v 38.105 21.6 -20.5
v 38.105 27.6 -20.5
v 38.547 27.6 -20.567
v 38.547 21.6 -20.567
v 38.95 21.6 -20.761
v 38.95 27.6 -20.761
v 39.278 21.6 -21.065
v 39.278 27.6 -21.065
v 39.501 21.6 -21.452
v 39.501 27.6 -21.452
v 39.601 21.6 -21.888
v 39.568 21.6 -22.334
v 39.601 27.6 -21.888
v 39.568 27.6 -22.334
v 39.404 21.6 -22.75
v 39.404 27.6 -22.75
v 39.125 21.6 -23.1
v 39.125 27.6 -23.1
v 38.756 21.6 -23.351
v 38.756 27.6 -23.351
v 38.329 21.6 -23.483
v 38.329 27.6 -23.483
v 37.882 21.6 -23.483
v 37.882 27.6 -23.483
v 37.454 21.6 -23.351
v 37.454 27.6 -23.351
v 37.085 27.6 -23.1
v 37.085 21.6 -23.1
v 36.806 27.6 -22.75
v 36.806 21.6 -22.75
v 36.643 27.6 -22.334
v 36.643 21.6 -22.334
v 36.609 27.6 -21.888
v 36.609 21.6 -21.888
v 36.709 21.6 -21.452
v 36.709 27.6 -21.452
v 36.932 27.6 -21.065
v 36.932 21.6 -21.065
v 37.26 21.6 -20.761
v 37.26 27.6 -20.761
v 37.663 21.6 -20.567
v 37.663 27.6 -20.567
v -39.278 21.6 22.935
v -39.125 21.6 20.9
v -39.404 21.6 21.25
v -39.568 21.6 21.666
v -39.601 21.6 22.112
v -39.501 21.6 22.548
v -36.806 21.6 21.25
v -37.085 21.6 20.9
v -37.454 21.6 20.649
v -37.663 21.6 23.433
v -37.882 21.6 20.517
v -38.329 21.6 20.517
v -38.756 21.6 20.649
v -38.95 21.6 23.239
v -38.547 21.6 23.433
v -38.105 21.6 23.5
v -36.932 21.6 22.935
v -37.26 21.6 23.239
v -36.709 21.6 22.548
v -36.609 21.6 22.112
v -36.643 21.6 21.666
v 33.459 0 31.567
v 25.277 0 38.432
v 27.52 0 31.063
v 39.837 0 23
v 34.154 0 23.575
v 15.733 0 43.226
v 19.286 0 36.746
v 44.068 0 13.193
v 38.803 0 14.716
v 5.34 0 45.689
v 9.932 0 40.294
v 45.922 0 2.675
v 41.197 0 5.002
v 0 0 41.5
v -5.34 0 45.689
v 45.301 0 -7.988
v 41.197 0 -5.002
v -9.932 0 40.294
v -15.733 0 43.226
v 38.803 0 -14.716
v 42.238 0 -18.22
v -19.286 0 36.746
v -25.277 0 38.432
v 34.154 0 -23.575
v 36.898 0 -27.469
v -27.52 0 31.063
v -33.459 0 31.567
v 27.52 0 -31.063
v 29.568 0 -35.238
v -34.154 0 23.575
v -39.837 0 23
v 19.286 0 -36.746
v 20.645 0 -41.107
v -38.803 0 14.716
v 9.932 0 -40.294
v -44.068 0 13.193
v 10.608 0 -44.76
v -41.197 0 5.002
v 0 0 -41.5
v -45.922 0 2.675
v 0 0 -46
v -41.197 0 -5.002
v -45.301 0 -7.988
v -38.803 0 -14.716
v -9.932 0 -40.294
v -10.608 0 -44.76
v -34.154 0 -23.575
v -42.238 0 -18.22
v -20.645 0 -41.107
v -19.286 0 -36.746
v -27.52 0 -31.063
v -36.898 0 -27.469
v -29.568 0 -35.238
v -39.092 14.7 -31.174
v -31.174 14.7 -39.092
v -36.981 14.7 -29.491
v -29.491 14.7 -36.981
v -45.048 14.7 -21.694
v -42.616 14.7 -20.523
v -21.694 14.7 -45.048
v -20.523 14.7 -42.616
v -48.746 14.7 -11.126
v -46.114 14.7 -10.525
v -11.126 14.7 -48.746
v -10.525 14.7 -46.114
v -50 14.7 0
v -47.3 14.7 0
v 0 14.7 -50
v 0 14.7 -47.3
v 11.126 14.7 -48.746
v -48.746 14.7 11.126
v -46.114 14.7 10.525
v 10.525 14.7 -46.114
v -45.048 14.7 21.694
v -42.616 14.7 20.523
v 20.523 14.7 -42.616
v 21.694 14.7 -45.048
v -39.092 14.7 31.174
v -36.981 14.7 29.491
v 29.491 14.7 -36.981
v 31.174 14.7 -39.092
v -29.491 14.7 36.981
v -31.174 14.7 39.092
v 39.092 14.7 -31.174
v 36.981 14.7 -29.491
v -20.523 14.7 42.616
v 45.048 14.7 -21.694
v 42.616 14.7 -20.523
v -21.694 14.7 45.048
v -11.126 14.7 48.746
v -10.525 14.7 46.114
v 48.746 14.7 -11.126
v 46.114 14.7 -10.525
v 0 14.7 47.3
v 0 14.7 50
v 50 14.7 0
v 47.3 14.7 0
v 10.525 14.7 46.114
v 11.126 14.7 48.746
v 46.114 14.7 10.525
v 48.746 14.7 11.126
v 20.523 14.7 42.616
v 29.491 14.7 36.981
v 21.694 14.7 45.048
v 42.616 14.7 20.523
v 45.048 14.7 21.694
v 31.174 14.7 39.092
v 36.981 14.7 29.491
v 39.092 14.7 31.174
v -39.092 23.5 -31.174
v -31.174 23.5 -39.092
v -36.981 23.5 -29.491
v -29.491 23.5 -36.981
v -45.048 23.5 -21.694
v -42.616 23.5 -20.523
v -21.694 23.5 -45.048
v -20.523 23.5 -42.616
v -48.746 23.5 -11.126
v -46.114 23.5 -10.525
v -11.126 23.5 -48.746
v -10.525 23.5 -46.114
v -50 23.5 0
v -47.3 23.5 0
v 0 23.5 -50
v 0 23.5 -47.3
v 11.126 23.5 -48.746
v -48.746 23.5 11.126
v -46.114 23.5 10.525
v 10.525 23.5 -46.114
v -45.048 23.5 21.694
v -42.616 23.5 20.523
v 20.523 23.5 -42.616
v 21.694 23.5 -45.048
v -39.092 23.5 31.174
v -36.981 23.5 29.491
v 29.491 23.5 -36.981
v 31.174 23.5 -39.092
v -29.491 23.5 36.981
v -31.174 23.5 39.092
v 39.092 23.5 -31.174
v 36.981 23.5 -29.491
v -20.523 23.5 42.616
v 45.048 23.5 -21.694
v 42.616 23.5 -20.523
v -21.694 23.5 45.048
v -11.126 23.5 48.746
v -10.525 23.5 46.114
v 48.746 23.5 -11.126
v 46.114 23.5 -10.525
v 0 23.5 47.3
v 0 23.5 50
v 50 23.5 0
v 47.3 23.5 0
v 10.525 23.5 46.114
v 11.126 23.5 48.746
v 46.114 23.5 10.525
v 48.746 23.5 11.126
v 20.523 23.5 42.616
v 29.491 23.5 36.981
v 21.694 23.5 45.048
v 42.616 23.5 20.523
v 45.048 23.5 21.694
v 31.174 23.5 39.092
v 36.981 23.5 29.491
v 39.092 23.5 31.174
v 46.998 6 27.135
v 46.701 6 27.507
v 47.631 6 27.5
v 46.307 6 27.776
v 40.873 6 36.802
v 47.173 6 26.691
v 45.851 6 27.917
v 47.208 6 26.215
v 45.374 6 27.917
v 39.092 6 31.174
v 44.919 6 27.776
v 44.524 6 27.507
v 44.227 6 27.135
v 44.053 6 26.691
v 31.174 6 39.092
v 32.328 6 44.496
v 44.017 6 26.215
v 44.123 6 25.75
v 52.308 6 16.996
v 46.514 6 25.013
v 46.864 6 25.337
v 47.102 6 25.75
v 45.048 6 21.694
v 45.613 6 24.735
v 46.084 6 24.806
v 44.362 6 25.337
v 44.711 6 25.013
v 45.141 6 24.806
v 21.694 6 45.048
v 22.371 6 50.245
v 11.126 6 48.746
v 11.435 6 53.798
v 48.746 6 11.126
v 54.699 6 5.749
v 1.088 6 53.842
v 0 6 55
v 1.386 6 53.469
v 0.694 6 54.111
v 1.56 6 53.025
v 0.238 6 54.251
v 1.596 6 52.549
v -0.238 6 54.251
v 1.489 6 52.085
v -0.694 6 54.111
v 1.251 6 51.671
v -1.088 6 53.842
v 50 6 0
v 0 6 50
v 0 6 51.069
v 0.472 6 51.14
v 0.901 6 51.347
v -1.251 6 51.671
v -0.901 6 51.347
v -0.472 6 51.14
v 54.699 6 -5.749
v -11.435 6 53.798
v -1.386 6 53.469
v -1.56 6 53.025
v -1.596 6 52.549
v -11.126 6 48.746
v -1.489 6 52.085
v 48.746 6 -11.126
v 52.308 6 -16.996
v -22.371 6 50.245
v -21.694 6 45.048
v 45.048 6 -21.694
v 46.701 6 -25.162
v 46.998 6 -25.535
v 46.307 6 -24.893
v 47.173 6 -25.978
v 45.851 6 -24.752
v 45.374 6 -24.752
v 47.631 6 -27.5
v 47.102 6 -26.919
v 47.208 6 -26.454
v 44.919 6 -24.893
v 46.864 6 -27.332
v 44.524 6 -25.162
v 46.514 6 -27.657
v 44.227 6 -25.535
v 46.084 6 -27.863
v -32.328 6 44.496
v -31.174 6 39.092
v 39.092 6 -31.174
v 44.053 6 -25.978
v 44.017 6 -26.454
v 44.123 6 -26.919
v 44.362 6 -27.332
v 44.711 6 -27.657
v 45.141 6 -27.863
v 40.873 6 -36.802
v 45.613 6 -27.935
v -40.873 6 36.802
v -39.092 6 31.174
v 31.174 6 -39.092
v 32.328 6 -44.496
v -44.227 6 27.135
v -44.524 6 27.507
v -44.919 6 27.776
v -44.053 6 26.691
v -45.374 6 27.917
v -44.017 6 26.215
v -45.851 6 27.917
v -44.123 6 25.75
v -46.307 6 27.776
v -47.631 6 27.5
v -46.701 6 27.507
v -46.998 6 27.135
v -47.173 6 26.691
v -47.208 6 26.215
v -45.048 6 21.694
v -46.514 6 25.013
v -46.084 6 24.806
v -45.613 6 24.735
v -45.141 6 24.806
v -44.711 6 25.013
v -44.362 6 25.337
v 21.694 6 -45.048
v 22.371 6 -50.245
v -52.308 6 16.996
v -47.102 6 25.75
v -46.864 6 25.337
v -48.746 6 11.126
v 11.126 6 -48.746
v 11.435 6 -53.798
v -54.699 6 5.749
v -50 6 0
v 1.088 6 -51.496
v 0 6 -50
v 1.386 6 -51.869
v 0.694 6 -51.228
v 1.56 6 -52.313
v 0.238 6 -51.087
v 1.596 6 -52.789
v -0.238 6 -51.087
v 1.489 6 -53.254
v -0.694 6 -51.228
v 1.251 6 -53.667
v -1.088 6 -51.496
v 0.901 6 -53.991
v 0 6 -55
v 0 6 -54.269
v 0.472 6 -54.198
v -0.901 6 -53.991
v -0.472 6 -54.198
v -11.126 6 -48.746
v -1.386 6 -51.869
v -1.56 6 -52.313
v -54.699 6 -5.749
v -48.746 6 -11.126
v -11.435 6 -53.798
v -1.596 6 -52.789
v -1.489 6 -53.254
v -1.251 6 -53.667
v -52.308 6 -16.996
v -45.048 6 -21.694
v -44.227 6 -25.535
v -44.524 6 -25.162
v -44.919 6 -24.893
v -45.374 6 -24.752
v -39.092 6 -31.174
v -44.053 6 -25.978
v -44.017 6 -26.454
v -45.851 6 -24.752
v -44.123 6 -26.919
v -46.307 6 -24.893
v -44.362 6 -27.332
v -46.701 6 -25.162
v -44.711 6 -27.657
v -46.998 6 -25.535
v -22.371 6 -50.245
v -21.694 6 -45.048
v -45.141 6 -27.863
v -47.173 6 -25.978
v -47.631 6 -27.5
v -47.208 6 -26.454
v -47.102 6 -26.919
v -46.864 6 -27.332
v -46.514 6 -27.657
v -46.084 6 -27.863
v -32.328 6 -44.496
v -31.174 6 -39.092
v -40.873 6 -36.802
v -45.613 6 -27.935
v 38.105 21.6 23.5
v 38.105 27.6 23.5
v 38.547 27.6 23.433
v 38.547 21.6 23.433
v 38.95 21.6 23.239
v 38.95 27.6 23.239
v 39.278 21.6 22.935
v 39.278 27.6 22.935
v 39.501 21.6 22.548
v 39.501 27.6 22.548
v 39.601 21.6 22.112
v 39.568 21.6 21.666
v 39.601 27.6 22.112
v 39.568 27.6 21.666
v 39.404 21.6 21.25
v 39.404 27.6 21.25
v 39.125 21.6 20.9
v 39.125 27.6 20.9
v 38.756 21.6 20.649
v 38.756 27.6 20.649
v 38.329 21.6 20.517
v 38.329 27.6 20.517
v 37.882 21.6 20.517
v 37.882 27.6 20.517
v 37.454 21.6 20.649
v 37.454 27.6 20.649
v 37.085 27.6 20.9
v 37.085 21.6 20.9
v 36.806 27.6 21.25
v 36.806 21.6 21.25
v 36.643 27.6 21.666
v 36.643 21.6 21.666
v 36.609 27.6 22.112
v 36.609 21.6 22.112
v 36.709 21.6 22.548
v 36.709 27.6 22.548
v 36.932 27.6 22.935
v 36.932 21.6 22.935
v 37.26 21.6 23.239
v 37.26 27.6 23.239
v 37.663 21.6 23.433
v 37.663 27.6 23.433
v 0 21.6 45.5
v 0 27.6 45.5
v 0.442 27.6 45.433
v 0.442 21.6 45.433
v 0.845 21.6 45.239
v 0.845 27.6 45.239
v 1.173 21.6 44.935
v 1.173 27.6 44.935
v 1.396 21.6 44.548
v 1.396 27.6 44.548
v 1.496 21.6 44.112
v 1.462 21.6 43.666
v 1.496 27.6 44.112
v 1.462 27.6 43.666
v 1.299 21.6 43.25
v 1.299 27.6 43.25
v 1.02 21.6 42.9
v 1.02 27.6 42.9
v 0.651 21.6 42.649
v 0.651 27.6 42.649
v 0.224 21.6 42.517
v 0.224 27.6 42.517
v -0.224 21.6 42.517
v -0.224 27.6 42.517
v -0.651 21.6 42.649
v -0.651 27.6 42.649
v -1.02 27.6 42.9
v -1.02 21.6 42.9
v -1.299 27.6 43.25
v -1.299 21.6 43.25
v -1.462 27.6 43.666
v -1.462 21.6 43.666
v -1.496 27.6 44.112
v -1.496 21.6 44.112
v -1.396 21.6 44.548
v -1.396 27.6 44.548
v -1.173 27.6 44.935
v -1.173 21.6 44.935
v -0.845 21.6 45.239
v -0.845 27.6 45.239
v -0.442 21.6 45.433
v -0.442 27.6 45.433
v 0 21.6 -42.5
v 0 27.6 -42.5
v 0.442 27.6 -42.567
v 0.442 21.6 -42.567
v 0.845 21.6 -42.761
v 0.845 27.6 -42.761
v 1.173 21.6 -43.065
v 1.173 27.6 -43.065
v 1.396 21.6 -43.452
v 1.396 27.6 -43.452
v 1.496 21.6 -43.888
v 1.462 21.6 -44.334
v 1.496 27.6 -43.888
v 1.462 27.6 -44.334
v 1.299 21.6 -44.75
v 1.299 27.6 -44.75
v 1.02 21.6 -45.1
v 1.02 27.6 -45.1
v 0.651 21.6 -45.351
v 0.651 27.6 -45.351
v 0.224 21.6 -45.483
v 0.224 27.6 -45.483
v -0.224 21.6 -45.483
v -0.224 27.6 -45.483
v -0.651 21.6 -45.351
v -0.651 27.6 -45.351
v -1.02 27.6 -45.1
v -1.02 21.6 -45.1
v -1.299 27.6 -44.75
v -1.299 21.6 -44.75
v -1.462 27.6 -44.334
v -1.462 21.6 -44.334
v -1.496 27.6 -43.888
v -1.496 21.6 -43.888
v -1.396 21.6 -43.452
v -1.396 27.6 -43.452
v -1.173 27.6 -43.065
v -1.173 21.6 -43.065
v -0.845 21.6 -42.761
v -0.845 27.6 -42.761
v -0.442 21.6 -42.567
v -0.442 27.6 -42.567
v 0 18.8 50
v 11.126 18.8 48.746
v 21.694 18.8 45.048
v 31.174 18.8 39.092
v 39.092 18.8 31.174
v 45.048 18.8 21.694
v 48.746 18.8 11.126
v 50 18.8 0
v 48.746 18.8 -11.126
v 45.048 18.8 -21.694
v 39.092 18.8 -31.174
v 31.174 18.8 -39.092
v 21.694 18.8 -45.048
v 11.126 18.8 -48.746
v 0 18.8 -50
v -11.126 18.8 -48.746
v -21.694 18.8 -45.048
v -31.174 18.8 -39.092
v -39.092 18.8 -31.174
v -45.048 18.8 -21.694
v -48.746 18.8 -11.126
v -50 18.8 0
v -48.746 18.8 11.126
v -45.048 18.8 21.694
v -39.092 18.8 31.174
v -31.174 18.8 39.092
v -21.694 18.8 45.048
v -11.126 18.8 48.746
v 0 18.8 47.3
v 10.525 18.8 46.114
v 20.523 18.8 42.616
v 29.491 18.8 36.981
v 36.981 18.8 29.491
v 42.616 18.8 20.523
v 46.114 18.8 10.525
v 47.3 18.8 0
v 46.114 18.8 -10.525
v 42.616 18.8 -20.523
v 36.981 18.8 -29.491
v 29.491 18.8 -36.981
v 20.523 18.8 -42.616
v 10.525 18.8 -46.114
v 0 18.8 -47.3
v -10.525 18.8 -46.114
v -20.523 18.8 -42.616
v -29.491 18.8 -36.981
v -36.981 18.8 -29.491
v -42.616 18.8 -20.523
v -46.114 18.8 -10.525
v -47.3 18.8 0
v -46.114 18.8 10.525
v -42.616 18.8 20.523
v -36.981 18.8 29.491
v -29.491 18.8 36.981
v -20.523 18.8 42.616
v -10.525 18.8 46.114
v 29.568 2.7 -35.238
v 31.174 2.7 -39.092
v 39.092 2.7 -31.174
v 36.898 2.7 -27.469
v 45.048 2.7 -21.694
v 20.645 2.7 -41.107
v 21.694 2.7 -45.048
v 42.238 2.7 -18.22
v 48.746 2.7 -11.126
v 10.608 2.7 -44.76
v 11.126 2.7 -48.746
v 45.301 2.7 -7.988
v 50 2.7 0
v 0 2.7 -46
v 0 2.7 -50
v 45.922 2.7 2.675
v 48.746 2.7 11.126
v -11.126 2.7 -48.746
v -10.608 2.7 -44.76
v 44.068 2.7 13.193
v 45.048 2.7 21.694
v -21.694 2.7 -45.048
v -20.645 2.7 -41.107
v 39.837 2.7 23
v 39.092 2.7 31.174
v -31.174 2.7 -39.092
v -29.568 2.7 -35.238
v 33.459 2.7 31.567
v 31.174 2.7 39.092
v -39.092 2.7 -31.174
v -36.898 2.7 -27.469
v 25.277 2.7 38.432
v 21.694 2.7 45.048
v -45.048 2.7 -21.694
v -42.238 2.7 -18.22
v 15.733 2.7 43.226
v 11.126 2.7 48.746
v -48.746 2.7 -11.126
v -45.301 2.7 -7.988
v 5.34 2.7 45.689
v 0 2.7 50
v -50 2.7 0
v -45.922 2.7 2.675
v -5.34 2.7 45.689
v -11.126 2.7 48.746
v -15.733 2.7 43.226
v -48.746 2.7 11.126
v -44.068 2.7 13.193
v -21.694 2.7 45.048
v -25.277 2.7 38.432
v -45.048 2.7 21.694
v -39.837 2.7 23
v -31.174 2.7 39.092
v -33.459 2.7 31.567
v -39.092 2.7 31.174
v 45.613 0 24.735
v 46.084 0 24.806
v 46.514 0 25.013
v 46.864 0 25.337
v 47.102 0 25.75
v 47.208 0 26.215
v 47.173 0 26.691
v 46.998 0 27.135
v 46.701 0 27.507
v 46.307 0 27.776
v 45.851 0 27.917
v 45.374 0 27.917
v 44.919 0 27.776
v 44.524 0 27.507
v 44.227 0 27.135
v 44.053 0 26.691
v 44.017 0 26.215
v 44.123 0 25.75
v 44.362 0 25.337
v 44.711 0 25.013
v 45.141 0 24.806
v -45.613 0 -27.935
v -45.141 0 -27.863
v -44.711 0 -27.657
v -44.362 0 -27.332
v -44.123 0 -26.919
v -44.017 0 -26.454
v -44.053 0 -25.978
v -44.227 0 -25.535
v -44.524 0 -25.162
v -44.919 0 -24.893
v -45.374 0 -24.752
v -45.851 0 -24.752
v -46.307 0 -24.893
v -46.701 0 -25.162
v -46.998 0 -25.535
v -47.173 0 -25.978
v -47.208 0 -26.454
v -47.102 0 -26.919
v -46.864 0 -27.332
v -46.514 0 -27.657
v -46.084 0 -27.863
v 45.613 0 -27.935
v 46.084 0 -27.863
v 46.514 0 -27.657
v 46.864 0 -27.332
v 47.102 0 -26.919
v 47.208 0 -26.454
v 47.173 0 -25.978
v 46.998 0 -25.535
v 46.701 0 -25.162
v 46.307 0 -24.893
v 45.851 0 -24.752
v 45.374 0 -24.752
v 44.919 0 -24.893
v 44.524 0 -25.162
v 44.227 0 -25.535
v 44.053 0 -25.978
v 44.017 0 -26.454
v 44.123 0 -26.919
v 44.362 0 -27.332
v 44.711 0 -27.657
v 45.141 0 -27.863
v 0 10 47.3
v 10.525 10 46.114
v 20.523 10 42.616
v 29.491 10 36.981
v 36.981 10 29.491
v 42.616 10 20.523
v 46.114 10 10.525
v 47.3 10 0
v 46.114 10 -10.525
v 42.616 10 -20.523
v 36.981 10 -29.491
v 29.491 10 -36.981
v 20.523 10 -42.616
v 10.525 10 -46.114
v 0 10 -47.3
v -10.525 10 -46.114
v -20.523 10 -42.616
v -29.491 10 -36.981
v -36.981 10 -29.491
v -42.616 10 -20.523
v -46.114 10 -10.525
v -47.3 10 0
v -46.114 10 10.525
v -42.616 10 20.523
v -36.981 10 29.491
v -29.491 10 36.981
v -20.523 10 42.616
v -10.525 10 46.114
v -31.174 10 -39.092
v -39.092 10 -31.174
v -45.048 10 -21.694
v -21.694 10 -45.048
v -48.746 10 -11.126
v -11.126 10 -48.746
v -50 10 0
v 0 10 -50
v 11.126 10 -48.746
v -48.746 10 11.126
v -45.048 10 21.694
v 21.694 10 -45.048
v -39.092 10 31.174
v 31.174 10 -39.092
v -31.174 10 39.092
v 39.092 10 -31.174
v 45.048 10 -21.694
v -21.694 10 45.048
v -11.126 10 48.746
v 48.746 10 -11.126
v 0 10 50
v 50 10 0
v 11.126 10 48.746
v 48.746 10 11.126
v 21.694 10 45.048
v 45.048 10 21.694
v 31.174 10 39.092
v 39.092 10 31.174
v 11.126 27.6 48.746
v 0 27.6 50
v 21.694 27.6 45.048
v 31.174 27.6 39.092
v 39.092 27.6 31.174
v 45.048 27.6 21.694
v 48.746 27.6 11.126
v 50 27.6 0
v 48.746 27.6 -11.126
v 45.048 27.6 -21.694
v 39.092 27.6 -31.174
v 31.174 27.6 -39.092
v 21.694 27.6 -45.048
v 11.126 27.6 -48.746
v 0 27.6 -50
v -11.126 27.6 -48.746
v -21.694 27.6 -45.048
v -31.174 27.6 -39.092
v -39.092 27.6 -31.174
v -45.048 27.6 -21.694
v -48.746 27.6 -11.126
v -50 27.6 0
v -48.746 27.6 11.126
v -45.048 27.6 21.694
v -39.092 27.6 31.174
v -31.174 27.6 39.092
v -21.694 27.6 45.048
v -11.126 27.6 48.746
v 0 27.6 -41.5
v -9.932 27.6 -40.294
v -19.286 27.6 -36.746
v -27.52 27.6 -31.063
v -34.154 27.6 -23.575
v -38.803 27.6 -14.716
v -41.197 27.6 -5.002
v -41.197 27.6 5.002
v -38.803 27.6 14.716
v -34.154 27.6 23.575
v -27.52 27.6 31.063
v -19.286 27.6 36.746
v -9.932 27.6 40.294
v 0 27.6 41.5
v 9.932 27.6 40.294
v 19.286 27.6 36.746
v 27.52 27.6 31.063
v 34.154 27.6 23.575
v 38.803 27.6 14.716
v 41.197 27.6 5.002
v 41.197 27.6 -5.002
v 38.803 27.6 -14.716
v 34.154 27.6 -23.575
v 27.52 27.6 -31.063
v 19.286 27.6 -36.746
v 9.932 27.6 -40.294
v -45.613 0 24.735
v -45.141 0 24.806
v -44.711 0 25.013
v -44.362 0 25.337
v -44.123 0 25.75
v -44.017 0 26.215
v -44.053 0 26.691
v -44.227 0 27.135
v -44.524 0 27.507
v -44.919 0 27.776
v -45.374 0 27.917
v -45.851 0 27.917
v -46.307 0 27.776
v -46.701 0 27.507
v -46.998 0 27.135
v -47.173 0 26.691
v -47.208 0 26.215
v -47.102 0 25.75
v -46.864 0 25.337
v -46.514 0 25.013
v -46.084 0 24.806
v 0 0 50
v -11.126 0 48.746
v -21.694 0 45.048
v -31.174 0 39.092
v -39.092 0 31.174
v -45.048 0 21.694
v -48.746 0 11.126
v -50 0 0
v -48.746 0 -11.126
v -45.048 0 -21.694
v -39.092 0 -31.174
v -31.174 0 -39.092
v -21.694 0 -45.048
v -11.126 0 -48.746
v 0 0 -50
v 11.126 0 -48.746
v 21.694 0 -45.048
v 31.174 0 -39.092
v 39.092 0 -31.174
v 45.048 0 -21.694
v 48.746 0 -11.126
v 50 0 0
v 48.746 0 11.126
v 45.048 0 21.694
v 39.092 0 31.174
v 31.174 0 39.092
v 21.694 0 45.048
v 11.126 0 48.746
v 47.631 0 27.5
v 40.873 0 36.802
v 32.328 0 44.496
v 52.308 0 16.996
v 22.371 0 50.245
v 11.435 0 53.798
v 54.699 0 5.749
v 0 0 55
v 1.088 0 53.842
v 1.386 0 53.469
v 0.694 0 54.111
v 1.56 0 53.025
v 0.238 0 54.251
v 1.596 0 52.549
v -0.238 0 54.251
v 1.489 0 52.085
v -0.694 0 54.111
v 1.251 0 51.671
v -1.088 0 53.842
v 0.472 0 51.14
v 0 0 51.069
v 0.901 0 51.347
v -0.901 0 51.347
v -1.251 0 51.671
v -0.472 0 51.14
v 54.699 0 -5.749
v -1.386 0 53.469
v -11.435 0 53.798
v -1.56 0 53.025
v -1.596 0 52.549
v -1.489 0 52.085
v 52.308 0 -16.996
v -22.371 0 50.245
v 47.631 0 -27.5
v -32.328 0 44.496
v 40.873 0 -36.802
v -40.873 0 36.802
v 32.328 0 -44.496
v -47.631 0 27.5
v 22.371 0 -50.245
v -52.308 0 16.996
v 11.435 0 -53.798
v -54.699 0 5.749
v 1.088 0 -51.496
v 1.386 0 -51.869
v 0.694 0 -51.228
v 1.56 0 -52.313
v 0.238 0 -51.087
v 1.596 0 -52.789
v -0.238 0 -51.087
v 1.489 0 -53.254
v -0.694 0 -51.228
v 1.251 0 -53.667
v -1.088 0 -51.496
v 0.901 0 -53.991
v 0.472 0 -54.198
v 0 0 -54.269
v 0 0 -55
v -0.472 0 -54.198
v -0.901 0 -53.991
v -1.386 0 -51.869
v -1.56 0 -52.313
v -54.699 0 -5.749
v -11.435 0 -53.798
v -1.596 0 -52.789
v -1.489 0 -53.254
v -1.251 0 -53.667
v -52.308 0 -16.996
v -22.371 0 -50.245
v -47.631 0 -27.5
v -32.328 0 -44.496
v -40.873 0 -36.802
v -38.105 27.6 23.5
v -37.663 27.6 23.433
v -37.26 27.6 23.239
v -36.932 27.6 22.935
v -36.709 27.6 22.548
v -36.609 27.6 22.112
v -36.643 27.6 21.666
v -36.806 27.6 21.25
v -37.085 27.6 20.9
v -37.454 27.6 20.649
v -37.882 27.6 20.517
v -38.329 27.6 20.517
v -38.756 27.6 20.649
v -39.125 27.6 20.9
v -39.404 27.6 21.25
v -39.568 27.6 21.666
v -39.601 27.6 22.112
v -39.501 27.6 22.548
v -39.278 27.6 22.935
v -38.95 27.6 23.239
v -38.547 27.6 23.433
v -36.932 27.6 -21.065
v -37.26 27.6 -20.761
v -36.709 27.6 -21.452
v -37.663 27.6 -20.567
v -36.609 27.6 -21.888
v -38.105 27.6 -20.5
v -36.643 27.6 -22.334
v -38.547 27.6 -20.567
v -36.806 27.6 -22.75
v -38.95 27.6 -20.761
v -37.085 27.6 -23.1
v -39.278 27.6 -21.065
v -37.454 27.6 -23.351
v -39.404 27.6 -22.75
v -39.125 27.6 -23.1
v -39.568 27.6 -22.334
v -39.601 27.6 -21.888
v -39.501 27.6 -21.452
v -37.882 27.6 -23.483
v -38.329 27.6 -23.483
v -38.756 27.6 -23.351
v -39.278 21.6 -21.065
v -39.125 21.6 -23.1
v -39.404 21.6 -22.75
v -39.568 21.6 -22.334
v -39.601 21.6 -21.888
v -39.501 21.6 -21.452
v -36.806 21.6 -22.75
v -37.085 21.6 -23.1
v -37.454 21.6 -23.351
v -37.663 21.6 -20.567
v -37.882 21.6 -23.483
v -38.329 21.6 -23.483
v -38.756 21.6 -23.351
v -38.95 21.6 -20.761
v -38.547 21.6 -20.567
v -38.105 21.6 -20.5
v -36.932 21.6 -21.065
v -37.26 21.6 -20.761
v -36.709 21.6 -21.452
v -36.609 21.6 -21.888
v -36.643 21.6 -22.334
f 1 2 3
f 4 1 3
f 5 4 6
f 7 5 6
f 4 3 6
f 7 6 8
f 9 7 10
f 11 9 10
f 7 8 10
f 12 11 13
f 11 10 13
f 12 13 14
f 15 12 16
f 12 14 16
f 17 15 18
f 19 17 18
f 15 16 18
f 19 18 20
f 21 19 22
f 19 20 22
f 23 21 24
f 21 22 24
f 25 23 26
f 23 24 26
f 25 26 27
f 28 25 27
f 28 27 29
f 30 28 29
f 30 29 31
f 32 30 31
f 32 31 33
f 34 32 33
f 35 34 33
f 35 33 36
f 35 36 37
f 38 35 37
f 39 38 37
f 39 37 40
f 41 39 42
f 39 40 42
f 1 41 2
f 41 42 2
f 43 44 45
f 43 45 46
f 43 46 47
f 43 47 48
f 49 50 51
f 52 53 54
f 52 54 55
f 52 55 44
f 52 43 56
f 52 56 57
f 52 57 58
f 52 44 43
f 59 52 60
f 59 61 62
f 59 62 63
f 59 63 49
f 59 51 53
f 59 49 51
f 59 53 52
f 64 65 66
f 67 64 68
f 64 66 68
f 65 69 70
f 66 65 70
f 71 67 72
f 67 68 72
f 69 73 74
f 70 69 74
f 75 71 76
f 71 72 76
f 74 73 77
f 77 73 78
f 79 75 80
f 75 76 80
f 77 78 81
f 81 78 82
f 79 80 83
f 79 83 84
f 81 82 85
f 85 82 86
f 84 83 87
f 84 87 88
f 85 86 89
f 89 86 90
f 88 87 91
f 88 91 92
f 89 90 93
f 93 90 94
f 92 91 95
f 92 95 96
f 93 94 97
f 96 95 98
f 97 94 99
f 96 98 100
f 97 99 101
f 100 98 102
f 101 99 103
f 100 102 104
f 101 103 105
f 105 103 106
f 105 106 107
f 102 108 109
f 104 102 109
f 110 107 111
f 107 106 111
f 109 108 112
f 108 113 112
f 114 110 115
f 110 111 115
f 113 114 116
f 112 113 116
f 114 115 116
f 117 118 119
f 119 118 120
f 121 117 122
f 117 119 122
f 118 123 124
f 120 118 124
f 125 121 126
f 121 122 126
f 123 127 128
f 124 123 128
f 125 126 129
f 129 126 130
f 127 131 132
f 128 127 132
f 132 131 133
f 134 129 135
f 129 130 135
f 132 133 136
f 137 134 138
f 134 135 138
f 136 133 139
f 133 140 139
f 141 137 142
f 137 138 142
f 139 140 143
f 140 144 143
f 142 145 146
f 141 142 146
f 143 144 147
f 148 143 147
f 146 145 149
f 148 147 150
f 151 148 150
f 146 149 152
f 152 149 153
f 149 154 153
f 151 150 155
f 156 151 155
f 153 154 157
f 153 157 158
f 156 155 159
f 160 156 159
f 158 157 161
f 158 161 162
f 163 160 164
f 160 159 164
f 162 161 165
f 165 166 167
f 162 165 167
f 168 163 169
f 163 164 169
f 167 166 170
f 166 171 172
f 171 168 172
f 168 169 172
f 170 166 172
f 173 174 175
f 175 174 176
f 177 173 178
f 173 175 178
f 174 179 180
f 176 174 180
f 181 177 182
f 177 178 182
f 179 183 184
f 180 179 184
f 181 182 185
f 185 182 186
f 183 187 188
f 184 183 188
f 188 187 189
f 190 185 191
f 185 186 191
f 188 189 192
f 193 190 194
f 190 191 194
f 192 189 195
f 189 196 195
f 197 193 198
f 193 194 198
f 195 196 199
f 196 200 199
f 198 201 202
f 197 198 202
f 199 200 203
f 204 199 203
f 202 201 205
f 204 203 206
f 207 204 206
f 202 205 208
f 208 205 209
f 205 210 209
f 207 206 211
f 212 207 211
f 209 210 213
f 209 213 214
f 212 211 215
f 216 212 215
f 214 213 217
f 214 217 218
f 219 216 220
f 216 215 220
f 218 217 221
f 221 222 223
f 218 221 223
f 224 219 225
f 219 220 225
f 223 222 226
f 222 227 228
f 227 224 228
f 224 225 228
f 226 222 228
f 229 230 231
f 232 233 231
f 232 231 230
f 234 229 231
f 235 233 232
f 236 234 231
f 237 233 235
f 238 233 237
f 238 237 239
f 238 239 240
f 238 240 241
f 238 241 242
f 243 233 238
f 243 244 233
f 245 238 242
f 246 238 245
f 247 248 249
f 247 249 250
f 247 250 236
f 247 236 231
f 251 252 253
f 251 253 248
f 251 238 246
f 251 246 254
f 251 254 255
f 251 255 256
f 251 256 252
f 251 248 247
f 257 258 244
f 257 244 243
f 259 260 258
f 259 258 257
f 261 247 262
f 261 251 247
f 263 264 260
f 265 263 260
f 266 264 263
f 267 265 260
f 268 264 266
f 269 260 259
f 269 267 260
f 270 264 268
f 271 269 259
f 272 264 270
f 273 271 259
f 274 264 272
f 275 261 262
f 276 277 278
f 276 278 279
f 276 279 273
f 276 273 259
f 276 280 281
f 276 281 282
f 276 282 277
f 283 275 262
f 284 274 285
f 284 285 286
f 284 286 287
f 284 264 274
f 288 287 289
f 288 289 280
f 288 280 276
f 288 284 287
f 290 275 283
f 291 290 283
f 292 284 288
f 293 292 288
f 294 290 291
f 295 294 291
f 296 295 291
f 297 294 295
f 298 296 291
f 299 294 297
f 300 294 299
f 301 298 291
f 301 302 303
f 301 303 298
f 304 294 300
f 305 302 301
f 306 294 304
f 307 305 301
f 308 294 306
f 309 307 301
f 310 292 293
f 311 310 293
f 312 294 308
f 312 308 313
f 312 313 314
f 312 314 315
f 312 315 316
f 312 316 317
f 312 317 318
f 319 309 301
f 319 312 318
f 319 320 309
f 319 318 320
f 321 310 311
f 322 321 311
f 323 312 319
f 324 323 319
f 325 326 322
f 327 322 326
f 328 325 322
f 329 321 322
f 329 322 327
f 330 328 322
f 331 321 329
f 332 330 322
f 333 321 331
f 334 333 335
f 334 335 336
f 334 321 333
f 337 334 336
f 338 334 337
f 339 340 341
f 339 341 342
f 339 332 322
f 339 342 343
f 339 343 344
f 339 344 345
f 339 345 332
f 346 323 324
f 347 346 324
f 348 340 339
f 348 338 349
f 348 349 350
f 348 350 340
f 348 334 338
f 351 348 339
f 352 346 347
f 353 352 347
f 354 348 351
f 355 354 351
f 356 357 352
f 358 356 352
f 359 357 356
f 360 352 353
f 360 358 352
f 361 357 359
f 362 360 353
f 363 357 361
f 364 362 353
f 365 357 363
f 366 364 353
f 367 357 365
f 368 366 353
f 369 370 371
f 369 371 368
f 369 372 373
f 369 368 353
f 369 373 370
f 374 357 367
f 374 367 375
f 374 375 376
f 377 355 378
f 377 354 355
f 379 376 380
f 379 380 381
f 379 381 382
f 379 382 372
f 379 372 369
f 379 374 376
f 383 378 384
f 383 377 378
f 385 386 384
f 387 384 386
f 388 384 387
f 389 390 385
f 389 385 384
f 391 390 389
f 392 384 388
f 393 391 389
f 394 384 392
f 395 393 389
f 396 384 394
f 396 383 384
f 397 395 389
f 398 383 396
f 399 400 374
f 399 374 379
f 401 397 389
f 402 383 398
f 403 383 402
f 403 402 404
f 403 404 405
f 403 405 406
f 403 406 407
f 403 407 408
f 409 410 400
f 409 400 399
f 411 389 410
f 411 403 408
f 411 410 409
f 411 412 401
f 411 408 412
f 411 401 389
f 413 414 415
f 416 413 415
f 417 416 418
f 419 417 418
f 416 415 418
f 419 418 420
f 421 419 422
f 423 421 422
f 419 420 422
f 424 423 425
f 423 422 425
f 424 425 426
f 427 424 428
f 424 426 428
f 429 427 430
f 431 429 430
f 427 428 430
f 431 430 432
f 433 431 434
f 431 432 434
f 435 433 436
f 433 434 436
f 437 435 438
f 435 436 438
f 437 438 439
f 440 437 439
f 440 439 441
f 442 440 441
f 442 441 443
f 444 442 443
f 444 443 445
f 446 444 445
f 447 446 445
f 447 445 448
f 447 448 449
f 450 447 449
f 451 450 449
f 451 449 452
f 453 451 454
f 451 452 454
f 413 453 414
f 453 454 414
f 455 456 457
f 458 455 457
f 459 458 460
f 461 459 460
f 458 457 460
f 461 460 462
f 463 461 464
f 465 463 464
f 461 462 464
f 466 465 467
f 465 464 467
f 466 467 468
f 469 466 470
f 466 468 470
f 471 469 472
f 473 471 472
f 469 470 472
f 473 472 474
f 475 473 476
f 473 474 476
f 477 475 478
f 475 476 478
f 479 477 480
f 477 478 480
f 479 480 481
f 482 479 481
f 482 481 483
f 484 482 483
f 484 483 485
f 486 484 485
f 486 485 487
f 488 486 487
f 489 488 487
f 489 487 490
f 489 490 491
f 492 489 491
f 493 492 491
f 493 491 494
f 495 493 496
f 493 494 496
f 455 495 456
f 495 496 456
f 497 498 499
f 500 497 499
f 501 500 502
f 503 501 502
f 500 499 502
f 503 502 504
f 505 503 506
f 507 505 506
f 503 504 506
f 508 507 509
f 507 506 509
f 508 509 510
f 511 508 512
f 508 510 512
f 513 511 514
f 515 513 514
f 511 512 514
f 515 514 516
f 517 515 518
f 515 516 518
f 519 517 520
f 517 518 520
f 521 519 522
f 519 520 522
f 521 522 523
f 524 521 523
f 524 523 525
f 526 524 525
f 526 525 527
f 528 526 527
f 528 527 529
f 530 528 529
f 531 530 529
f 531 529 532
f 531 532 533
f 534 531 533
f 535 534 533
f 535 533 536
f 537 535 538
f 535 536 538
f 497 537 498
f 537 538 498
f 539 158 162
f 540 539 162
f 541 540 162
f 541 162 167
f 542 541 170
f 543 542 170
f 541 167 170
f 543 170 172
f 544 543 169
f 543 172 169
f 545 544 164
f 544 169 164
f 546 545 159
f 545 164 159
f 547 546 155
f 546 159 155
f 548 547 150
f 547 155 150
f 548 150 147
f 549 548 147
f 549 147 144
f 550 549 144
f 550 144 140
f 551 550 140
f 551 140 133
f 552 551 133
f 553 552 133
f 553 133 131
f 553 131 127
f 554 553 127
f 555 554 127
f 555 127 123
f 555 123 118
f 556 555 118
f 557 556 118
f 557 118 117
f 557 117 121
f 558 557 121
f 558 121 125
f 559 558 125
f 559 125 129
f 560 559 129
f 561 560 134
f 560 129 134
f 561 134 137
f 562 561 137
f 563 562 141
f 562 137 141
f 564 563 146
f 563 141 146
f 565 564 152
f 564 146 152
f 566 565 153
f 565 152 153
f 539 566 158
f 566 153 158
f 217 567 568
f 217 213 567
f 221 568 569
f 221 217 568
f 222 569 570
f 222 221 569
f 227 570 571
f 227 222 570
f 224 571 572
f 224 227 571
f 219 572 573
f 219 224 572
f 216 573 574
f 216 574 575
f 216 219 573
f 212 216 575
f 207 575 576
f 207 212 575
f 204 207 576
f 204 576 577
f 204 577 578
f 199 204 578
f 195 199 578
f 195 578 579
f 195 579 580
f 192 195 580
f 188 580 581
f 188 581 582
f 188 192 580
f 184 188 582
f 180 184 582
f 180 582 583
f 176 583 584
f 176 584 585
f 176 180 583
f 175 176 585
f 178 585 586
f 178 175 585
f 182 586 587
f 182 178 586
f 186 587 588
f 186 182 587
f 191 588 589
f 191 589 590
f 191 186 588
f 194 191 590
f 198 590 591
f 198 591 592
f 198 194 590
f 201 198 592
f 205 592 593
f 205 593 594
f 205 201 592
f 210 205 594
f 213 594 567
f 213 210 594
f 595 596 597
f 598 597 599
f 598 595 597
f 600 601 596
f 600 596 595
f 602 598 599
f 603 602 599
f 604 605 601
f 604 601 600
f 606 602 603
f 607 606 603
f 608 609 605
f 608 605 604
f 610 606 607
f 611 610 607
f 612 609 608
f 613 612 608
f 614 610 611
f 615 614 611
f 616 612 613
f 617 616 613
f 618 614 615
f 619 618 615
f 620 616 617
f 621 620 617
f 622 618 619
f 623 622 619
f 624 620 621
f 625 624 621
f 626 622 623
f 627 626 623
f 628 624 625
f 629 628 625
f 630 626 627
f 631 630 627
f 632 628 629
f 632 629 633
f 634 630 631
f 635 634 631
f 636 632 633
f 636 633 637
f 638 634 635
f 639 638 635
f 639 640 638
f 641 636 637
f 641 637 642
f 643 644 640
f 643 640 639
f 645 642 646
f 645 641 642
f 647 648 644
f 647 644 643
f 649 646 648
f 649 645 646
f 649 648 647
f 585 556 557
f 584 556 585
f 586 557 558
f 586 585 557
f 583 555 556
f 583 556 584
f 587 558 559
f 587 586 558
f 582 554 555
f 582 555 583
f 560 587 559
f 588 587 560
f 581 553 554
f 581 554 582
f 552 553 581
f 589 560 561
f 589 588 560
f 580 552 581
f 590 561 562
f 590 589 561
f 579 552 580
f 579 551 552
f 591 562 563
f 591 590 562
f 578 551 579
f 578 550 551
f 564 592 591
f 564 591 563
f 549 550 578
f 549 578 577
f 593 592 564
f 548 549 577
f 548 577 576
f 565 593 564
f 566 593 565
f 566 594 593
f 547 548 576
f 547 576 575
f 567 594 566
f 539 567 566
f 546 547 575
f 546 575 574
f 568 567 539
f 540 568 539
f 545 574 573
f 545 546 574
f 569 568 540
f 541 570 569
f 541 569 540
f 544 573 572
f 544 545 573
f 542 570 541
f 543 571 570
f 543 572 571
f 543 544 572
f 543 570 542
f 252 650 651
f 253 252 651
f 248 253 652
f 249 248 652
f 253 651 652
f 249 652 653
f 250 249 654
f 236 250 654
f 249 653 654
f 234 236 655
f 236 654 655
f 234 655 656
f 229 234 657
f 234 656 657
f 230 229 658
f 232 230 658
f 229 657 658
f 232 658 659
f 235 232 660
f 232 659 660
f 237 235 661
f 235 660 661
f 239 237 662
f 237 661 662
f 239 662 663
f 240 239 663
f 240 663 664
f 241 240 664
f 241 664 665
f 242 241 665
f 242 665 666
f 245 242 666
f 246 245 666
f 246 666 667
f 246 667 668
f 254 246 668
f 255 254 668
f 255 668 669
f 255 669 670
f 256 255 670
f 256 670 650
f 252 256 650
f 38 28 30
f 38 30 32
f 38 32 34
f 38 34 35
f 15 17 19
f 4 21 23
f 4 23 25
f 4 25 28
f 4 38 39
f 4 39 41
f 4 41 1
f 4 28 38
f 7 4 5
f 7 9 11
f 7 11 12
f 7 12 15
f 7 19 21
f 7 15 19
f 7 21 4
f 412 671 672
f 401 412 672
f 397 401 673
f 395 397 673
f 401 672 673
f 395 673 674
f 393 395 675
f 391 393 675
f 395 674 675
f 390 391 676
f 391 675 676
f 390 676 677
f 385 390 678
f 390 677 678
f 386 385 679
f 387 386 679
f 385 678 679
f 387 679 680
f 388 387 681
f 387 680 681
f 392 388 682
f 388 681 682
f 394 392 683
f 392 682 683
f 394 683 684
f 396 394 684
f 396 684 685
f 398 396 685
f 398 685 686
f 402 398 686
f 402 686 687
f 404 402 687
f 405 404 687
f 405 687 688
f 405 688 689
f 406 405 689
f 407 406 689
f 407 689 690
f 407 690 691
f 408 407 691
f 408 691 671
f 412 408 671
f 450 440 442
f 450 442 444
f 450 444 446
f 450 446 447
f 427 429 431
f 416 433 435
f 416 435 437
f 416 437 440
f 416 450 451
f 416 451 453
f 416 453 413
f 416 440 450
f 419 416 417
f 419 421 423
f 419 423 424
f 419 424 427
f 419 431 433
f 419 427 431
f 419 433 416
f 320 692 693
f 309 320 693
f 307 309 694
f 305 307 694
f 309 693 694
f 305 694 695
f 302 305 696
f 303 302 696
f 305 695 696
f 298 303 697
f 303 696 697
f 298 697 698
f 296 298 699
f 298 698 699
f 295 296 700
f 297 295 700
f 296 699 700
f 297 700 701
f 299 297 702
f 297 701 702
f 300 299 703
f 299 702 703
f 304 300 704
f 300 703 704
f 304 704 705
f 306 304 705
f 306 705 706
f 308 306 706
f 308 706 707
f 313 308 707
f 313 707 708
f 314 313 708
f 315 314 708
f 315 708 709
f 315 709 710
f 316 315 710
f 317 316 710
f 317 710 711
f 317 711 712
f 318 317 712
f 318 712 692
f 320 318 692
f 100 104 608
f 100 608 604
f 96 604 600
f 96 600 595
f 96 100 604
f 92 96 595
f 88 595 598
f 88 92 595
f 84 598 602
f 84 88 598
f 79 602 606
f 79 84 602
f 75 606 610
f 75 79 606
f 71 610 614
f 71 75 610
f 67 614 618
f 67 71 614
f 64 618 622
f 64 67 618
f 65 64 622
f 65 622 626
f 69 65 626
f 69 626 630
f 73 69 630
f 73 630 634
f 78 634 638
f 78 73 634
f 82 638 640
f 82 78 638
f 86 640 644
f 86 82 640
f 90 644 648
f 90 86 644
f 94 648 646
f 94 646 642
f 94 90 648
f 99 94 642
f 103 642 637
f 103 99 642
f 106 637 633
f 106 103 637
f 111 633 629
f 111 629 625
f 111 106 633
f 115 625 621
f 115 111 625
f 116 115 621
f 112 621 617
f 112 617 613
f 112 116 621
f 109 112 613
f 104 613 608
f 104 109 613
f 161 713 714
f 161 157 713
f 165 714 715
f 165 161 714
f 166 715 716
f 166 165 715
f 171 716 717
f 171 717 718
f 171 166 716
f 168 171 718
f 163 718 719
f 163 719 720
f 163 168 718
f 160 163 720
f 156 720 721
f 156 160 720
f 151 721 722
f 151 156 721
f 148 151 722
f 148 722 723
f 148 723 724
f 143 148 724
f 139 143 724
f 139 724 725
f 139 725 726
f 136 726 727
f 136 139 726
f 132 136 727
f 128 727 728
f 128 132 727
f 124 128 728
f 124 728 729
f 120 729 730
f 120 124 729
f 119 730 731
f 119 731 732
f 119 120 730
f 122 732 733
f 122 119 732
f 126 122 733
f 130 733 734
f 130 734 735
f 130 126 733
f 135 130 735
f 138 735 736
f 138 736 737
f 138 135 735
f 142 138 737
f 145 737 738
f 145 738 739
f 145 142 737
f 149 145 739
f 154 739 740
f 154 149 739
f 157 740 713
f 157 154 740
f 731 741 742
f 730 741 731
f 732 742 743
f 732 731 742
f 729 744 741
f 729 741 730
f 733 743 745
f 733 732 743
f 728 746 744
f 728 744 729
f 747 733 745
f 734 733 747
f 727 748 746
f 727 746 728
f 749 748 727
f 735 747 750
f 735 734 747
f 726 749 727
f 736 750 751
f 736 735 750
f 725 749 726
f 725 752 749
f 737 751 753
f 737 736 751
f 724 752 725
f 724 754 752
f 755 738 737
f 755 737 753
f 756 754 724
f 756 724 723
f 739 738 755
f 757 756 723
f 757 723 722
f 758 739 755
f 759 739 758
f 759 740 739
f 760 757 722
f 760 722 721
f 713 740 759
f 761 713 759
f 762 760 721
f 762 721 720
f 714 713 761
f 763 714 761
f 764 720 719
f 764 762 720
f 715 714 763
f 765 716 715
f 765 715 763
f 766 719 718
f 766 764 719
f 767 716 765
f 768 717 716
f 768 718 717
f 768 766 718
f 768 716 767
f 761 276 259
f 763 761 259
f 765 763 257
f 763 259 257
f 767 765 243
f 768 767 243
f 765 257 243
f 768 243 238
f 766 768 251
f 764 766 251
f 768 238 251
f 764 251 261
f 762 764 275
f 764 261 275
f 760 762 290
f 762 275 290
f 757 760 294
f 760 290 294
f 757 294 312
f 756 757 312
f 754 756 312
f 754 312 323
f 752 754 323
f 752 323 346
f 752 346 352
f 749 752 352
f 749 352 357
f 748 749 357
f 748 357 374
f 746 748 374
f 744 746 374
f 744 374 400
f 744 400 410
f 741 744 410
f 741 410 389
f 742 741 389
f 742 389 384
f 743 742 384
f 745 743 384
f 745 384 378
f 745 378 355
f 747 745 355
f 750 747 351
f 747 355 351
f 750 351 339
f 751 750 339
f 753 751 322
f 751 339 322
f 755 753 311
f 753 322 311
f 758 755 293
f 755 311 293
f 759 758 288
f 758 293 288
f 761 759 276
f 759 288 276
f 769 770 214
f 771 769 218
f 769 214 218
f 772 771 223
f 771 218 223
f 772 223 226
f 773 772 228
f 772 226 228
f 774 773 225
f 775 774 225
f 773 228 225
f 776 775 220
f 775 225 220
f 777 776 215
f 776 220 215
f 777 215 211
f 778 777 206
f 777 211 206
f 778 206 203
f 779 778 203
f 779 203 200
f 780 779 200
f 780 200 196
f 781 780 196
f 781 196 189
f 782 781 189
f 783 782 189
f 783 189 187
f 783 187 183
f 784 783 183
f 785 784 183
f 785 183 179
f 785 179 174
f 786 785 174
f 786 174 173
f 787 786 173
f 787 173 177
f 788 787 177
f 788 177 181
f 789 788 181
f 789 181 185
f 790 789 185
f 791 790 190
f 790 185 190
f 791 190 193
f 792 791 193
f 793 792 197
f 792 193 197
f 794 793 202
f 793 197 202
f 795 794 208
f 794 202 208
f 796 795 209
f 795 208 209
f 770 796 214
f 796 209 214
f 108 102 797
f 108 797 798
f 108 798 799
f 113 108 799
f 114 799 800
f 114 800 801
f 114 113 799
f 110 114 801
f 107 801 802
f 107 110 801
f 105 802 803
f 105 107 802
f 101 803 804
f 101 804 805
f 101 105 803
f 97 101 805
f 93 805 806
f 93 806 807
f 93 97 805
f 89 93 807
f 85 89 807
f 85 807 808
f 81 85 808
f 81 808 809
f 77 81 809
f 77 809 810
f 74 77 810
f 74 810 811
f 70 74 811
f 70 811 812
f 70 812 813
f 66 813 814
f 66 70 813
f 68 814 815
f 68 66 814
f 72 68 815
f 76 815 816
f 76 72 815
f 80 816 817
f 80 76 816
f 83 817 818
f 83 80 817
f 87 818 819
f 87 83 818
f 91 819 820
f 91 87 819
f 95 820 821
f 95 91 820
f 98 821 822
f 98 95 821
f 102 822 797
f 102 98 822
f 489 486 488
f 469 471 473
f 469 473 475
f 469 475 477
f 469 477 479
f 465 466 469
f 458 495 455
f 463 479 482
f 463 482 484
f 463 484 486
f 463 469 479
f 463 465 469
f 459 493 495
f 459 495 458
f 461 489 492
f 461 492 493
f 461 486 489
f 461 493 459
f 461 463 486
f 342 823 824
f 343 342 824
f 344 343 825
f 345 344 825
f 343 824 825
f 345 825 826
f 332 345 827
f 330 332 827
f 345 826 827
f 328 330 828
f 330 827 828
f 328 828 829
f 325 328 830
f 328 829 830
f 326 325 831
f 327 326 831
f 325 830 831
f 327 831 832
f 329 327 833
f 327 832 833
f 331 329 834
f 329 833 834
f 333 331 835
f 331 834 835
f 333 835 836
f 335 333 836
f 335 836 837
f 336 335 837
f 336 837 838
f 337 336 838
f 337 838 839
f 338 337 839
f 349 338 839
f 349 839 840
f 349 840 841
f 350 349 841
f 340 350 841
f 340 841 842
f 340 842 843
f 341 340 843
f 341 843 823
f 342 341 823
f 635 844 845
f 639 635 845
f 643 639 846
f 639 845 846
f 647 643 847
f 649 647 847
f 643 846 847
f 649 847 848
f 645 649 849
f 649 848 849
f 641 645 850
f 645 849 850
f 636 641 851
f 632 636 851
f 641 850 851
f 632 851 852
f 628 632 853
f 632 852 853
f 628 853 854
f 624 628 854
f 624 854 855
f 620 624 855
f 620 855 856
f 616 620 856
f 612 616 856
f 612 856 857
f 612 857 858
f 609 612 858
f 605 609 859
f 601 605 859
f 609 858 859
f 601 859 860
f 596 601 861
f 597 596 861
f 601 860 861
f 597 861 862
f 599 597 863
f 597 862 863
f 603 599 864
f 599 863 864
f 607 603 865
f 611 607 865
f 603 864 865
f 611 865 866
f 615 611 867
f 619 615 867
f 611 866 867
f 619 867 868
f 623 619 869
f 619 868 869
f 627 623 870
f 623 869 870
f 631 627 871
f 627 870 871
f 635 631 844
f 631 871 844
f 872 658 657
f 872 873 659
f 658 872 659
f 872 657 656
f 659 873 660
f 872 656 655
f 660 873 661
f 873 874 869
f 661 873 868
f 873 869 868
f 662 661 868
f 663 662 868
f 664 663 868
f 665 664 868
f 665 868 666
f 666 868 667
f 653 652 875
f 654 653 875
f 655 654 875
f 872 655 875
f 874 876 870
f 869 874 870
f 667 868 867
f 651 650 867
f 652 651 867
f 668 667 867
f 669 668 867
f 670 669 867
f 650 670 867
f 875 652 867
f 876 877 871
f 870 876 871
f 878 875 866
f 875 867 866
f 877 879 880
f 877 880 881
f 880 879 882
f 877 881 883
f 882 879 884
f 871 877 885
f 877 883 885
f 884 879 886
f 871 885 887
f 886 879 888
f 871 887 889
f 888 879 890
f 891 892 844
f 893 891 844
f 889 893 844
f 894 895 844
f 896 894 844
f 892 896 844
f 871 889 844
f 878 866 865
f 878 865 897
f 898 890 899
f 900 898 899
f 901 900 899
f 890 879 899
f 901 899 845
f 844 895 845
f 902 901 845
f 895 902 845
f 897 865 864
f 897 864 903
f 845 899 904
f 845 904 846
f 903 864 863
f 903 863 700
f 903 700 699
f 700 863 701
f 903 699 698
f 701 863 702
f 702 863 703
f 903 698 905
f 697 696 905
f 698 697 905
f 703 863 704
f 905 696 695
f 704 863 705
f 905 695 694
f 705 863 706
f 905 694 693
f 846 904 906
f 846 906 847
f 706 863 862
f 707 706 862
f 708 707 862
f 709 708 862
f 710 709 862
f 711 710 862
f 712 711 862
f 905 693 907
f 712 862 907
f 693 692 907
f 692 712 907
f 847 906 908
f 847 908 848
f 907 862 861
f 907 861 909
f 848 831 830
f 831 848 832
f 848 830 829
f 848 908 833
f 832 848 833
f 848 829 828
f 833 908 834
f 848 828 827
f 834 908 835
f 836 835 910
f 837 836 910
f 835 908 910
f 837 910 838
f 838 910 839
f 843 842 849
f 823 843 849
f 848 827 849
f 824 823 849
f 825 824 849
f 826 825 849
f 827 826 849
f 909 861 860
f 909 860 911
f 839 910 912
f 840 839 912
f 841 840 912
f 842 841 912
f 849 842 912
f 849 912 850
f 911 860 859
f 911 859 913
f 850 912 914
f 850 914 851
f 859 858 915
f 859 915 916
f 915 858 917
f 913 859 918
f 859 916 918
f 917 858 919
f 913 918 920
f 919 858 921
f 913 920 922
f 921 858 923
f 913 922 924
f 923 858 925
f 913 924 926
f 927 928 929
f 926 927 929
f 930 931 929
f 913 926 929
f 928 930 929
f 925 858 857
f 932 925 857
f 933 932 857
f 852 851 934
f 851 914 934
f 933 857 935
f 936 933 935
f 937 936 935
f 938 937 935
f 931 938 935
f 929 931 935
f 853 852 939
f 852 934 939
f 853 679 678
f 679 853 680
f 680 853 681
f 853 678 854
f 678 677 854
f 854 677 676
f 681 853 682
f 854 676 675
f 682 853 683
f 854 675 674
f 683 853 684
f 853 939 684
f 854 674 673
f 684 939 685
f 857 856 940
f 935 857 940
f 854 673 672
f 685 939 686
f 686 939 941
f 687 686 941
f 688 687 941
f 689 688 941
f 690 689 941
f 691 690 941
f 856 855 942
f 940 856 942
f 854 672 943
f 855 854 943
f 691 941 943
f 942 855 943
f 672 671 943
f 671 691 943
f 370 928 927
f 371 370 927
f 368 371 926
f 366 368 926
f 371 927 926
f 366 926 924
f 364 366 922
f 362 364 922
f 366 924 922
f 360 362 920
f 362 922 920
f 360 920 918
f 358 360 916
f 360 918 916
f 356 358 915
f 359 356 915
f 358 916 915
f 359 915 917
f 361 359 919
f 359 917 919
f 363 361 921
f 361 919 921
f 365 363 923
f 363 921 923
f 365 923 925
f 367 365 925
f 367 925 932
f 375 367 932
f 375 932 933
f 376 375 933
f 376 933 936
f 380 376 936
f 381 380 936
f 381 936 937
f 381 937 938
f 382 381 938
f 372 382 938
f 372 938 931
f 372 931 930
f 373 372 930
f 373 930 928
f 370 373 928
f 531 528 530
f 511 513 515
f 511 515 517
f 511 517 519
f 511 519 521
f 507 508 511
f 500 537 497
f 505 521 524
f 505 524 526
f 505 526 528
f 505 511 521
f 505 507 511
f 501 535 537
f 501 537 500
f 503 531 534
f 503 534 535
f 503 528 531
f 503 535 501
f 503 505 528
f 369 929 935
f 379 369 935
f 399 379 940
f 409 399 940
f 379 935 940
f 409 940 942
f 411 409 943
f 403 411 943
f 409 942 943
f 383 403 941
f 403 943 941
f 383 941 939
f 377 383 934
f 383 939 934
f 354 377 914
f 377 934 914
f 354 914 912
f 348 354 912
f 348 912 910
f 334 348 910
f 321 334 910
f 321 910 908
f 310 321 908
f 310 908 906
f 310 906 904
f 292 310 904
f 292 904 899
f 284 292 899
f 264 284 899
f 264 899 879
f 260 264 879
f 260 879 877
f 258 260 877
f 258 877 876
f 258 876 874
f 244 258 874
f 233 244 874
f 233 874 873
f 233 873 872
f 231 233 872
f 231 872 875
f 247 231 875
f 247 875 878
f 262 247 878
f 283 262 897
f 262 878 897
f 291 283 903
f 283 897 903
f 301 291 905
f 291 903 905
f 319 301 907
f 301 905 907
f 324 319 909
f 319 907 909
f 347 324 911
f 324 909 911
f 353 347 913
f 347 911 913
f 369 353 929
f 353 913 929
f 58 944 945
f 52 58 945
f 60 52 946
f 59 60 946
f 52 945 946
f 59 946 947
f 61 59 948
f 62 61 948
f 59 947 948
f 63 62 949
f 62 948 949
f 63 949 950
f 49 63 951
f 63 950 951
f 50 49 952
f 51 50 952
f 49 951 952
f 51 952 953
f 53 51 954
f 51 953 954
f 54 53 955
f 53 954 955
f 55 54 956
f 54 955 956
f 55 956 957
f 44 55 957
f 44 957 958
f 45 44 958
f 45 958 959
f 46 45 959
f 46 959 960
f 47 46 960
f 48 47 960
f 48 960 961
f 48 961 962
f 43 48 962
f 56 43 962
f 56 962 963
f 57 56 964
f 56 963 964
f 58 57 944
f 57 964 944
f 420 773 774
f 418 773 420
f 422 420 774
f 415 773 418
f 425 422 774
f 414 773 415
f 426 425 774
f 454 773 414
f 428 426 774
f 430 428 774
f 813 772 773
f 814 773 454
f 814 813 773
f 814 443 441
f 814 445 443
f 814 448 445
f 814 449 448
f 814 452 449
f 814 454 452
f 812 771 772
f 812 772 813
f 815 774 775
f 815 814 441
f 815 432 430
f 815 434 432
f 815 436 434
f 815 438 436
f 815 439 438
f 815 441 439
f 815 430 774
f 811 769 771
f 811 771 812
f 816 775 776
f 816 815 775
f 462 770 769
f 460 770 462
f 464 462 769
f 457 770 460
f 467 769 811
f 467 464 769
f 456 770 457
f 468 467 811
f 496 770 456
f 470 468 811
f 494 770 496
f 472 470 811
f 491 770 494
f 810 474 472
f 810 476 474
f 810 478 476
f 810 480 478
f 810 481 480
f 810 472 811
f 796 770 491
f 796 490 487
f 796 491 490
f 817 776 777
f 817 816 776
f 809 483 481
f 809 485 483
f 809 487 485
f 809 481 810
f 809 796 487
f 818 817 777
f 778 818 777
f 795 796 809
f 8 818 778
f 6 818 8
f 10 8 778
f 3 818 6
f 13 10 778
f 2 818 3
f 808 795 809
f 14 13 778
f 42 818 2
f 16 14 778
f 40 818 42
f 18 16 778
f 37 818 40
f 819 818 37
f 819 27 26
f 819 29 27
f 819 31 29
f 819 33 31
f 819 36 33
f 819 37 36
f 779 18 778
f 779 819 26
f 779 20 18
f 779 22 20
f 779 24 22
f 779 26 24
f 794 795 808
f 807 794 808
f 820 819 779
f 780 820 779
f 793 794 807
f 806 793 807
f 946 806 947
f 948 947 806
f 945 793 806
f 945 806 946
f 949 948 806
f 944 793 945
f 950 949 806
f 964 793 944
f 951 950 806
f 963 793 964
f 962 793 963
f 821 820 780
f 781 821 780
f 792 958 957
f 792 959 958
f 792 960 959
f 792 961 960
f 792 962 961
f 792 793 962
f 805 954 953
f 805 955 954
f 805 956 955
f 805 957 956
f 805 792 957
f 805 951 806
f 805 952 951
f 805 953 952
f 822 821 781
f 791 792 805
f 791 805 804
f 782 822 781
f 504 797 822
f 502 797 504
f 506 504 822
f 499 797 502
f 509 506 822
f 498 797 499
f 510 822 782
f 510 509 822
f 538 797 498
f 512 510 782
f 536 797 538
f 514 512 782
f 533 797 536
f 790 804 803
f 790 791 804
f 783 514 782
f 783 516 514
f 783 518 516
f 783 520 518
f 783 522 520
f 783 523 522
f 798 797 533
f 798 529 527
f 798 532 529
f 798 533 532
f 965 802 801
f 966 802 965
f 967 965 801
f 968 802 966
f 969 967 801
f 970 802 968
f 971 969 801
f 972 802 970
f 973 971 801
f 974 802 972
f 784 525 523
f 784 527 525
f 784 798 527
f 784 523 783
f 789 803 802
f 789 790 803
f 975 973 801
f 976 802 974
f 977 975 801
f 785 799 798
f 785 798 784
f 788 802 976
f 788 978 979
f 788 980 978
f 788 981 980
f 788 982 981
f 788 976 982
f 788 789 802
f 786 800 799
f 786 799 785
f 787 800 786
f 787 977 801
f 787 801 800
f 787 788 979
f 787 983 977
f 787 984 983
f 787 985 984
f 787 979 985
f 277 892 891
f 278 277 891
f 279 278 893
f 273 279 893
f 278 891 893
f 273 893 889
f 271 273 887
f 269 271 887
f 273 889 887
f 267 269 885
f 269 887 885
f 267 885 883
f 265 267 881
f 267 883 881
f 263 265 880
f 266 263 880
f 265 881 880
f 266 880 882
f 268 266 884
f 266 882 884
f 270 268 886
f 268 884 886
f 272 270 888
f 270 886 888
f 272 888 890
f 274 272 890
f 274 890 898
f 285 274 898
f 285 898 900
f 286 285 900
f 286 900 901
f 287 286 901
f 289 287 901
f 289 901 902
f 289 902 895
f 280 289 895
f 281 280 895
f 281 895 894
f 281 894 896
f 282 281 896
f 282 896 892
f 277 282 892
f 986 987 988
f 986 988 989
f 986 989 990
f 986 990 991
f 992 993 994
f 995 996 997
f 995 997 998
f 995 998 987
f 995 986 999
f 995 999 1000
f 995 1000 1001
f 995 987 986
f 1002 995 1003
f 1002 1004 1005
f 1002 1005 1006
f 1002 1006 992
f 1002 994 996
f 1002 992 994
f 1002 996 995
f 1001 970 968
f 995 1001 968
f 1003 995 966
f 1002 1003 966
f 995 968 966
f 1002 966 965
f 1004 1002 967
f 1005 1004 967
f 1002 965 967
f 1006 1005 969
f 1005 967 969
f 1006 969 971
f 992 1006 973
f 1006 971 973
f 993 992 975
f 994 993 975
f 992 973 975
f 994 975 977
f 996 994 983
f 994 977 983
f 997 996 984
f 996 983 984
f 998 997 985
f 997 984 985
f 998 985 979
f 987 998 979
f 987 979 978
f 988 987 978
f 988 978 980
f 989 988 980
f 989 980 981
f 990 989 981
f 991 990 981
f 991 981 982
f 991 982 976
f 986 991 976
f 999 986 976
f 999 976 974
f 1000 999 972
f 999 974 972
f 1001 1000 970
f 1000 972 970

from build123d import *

# Parameters (mm, degrees)
SKETCH_1_R          = 55
SKETCH_1_R_2        = 41.5
EXTRUDE_1_DEPTH     = 27.6
CUT_EXTRUDE_START   = -21.6
SKETCH_2_R          = 55
SKETCH_2_R_2        = 50
CUT_EXTRUDE_1_DEPTH = 21.6
SKETCH_3_W          = 2.7
SKETCH_3_H          = 4.7
SKETCH_4_R          = 50
SKETCH_4_R_2        = 46
CUT_EXTRUDE_2_DEPTH = 2.7
SKETCH_5_R          = 1.6
CUT_EXTRUDE_3_DEPTH = 83.533387184
SKETCH_6_R          = 1.5
CUT_EXTRUDE_4_DEPTH = 6


with BuildPart() as part:
    # 草图1 → 凸台-拉伸1 (new body)
    with BuildSketch(Plane(origin=(0, 0, 0), x_dir=(1, 0, 0), z_dir=(0, 1, 0))):
        with Locations(Location((0, 0, 0), (0, 0, 90))):
            Circle(SKETCH_1_R)
        with Locations(Location((0, 0, 0), (0, 0, 90))):
            Circle(SKETCH_1_R_2, mode=Mode.SUBTRACT)
    extrude(amount=EXTRUDE_1_DEPTH)

    # 草图2 → 切除-拉伸1 (cut)
    with BuildSketch(Plane(origin=(0, 27.6, 0), x_dir=(1, 0, 0), z_dir=(0, 1, 0)).offset(CUT_EXTRUDE_START)):
        with Locations(Location((0, 0, 0), (0, 0, 90))):
            Circle(SKETCH_2_R)
        with Locations(Location((0, 0, 0), (0, 0, 270))):
            Circle(SKETCH_2_R_2, mode=Mode.SUBTRACT)
    extrude(amount=CUT_EXTRUDE_1_DEPTH, mode=Mode.SUBTRACT)

    # 草图3 → 切除-旋转1 (revolve, cut)
    with BuildSketch(Plane.XY, mode=Mode.PRIVATE) as cut_revolve_1_sk:
        with Locations((-48.65, 21.15)):
            Rectangle(SKETCH_3_W, SKETCH_3_H)
        with Locations((-48.65, 12.35)):
            Rectangle(SKETCH_3_W, SKETCH_3_H)
    revolve(cut_revolve_1_sk.sketch.rotate(Axis((0, 0, 0), (0, 1, 0)), 90), axis=Axis((0, 0, 0), (0, 1, 0)), mode=Mode.SUBTRACT)

    # 草图4 → 切除-拉伸2 (cut)
    with BuildSketch(Plane.XZ):
        with Locations(Location((0, 0, 0), (0, 0, 90))):
            Circle(SKETCH_4_R)
        with Locations(Location((0, 0, 0), (0, 0, 270))):
            Circle(SKETCH_4_R_2, mode=Mode.SUBTRACT)
    extrude(amount=-CUT_EXTRUDE_2_DEPTH, mode=Mode.SUBTRACT)

    # 草图5 → 切除-拉伸3 (cut, through all)
    with BuildSketch(Plane.XZ):
        with Locations(Location((45.612736373, 26.334525624, 0), (0, 0, 270))):
            Circle(SKETCH_5_R)
        with Locations(Location((45.612736373, -26.334525624, 0), (0, 0, 270))):
            Circle(SKETCH_5_R)
        with Locations(Location((0, -52.669051247, 0), (0, 0, 270))):
            Circle(SKETCH_5_R)
        with Locations(Location((-45.612736373, -26.334525624, 0), (0, 0, 270))):
            Circle(SKETCH_5_R)
        with Locations(Location((-45.612736373, 26.334525624, 0), (0, 0, 270))):
            Circle(SKETCH_5_R)
        with Locations(Location((0, 52.669051247, 0), (0, 0, 270))):
            Circle(SKETCH_5_R)
    extrude(amount=-CUT_EXTRUDE_3_DEPTH, mode=Mode.SUBTRACT)

    # 草图6 → 切除-拉伸4 (cut)
    with BuildSketch(Plane(origin=(0, 27.6, 0), x_dir=(1, 0, 0), z_dir=(0, 1, 0))):
        with Locations(Location((38.105117767, 22, 0), (0, 0, 270))):
            Circle(SKETCH_6_R)
        with Locations(Location((38.105117767, -22, 0), (0, 0, 270))):
            Circle(SKETCH_6_R)
        with Locations(Location((0, -44, 0), (0, 0, 270))):
            Circle(SKETCH_6_R)
        with Locations(Location((-38.105117767, -22, 0), (0, 0, 270))):
            Circle(SKETCH_6_R)
        with Locations(Location((-38.105117767, 22, 0), (0, 0, 270))):
            Circle(SKETCH_6_R)
        with Locations(Location((0, 44, 0), (0, 0, 270))):
            Circle(SKETCH_6_R)
    extrude(amount=-CUT_EXTRUDE_4_DEPTH, mode=Mode.SUBTRACT)


solid = part.part
